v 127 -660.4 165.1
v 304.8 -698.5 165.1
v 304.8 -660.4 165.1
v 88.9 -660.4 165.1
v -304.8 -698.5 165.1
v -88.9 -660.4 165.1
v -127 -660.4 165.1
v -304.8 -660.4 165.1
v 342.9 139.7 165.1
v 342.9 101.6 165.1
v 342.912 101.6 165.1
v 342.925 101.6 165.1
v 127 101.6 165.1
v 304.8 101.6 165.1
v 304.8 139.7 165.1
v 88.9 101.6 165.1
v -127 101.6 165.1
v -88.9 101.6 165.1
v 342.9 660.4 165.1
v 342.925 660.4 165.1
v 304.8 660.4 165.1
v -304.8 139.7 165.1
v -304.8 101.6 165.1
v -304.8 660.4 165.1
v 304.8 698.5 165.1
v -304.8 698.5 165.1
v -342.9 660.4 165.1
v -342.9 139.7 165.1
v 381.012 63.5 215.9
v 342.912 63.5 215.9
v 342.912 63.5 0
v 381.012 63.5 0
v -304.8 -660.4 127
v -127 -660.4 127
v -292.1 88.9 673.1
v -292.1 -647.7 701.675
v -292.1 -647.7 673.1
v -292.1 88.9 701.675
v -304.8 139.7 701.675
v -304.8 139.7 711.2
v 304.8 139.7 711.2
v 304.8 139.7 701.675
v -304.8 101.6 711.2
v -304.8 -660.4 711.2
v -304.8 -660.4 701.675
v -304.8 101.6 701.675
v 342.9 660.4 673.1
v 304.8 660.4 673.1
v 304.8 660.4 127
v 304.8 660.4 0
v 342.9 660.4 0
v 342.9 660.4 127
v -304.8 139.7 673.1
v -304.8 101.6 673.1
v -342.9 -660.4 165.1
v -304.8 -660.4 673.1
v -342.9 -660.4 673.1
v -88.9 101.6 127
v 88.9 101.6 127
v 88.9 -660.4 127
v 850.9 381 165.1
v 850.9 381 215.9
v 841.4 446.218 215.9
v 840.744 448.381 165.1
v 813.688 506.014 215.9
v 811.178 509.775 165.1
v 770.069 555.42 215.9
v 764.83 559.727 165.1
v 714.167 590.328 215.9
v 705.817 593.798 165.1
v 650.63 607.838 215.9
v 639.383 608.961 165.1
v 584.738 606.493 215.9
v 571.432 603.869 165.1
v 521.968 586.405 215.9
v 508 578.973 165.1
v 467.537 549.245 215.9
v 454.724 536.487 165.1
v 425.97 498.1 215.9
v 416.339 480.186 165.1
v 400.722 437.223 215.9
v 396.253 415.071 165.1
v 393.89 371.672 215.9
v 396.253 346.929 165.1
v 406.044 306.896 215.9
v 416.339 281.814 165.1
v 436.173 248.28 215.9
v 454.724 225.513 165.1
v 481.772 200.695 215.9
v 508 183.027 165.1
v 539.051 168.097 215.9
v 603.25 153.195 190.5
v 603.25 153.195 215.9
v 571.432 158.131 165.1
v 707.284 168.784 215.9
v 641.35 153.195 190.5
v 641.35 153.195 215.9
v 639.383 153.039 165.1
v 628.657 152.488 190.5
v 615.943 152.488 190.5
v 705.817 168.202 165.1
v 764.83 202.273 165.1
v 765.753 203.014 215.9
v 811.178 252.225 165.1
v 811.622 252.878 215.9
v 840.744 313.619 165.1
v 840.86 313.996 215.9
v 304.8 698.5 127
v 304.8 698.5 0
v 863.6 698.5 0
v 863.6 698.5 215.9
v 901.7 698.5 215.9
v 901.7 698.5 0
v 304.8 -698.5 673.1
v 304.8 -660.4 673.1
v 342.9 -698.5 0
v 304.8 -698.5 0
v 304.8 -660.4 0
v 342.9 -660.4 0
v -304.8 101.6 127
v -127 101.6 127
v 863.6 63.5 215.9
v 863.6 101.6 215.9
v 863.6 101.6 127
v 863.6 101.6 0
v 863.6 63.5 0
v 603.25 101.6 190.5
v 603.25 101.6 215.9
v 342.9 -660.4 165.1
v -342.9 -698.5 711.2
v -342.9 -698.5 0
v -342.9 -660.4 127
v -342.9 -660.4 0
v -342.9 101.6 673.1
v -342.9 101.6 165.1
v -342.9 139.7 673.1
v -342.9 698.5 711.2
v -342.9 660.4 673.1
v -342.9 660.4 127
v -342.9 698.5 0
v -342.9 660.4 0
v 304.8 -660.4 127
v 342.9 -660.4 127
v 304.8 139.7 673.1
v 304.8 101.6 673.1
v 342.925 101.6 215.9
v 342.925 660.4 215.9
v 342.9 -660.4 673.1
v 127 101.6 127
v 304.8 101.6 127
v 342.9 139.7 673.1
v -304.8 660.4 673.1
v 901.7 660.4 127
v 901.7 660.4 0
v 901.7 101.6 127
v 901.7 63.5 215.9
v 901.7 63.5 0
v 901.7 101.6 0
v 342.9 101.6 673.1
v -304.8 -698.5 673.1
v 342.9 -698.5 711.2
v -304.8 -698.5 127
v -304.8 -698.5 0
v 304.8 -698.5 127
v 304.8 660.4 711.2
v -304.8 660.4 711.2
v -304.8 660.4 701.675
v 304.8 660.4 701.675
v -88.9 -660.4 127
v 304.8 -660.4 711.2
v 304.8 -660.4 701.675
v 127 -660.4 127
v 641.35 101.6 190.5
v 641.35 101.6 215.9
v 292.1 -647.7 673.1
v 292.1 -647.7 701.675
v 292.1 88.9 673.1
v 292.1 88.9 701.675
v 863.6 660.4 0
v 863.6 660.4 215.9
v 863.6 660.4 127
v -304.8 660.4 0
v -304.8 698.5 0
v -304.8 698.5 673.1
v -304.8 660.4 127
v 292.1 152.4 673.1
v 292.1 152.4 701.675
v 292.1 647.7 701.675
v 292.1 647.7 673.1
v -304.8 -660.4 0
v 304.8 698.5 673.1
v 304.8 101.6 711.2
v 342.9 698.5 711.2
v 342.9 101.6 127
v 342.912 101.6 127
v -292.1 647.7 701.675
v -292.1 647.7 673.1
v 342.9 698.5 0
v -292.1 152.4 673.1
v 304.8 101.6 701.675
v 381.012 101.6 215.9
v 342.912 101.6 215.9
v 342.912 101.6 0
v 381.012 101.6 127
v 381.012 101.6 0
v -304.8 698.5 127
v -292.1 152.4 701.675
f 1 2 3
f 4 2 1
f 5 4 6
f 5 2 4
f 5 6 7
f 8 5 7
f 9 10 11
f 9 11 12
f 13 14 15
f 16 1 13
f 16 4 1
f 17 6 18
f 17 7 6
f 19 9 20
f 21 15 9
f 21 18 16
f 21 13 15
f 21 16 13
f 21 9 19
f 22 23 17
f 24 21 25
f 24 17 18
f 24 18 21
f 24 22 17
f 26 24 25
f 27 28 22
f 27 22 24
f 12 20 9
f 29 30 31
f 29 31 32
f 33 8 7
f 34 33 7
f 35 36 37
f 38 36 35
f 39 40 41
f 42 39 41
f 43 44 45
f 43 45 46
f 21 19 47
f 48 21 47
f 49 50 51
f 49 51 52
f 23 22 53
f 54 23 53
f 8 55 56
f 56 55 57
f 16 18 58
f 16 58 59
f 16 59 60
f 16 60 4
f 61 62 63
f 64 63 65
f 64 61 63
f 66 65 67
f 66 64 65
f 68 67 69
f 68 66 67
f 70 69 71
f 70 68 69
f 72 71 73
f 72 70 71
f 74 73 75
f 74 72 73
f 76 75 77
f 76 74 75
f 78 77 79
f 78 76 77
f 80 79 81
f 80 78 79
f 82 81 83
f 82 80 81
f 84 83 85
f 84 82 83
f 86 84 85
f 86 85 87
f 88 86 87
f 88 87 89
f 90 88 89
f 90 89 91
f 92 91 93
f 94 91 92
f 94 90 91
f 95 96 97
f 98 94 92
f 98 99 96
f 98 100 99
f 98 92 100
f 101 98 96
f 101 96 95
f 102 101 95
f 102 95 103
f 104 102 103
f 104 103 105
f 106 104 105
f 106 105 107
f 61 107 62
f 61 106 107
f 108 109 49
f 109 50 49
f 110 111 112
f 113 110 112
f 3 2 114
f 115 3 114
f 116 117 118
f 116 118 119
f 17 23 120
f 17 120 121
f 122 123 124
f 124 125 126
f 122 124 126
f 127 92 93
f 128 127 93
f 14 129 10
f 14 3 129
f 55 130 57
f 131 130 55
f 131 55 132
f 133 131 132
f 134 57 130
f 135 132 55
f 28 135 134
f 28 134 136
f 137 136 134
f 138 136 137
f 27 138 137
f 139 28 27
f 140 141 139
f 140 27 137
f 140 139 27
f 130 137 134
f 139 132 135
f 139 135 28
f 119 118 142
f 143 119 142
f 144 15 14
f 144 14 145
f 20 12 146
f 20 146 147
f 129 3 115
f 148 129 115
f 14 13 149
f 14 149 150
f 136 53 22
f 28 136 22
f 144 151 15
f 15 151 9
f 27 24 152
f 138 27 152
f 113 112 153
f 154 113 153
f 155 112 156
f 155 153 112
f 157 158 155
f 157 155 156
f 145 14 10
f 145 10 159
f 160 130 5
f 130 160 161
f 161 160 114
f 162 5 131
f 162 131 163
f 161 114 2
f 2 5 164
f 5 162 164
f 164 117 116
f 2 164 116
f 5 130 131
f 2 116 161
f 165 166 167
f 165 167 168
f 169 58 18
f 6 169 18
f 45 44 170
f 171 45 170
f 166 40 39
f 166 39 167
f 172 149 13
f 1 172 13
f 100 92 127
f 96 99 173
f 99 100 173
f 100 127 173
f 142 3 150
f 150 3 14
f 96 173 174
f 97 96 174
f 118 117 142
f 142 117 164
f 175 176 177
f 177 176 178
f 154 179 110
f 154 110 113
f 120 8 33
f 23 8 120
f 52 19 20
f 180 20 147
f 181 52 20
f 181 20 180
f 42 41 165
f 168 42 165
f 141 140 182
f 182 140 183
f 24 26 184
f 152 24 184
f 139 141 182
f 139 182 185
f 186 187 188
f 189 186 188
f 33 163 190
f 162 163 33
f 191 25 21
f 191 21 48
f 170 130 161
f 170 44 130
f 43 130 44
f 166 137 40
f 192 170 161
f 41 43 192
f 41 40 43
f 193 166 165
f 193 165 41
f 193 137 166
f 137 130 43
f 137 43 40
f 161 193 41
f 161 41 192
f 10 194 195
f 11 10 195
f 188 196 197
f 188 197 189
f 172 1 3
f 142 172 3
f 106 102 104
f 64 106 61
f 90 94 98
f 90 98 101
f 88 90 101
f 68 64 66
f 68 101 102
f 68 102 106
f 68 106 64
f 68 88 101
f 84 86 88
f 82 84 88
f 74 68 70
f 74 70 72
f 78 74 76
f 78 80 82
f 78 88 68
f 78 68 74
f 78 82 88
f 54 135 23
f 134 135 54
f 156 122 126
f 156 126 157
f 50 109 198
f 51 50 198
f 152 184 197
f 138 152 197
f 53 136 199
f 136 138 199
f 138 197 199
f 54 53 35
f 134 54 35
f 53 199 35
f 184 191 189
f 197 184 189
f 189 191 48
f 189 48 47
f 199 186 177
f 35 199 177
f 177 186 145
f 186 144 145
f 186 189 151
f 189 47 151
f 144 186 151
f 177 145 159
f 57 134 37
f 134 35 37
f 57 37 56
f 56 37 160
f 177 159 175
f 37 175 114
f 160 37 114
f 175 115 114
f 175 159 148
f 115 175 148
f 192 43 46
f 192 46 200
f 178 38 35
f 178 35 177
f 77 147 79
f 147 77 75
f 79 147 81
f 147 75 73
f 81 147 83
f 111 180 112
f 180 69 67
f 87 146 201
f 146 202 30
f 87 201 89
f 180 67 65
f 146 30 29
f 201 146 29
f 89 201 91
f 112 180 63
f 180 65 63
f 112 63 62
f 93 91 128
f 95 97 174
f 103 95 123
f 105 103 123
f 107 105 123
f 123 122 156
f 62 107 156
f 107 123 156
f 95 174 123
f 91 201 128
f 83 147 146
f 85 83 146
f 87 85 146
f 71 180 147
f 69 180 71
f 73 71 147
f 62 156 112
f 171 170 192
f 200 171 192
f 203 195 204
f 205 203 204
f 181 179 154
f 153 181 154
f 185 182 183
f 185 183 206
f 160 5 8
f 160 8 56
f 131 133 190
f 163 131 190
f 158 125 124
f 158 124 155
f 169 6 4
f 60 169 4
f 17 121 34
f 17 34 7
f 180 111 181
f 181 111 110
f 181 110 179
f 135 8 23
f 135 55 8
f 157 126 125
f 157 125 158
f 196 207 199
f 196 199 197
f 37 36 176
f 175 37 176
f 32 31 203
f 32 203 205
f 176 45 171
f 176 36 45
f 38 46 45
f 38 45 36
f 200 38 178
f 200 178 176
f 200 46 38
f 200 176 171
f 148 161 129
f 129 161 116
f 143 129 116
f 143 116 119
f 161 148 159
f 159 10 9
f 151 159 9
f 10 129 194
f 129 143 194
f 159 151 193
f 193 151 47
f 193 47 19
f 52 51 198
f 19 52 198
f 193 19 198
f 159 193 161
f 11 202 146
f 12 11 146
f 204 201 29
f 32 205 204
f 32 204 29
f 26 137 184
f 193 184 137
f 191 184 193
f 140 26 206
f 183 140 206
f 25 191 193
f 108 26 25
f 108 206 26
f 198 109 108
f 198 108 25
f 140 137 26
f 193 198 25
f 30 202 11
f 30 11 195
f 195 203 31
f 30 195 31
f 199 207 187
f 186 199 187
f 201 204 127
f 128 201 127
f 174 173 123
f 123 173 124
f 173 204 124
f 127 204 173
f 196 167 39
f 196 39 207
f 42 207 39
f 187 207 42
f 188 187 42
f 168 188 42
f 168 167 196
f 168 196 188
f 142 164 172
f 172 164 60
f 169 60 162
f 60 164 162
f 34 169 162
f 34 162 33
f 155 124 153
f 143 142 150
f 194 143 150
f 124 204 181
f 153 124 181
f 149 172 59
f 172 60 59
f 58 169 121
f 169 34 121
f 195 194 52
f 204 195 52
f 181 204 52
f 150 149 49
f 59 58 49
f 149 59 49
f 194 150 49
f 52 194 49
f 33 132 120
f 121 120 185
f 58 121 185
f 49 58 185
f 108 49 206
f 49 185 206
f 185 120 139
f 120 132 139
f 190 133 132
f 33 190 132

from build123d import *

# Parameters (mm, degrees)
F0_W           = 685.8
F0_H           = 1397
F1_DEPTH       = 711.2
F2_W           = 609.6
F2_H           = 508
F2_H_2         = 88.9
F3_DEPTH       = 800.1
F4_W           = 609.6
F4_H           = 88.9
F5_DEPTH       = 596.901
F6_W           = 609.6
F6_H           = 762
F7_DEPTH       = 9.525
F8_W           = 584.2
F8_H           = 736.6
F9_DEPTH       = 50.8
F10_W          = 609.6
F10_H          = 38.1
F11_DEPTH      = 1397.001
F12_W          = 762
F12_H          = 508
F12_W_2        = 1320.8
F12_H_2        = 127
F13_DEPTH      = 685.801
F14_W          = 609.6
F14_H          = 508
F15_DEPTH      = 584.2
F16_W          = 609.6
F16_H          = 520.7
F17_DEPTH      = 9.525
F18_W          = 584.2
F18_H          = 495.3
F19_DEPTH      = 28.575
F21_DEPTH      = 685.801
F22_W          = 558.8
F22_H          = 38.1
F23_DEPTH      = 558.8
F24_W          = 558.7746
F24_H          = 558.8
F24_R          = 228.6
F25_DEPTH      = 50.8
F26_W          = 38.1
F26_H          = 25.4
F27_DEPTH      = 52.5951328439
F28_W          = 38.1
F28_H          = 38.1
F29_DEPTH      = 127
F29_DEPTH_BACK = 88.9
F30_W          = 609.6
F30_H          = 508
F31_DEPTH      = 12.7
F32_W          = 609.6
F32_H          = 762
F33_DEPTH      = 165.101
F34_W          = 38.1
F34_H          = 38.1
F35_DEPTH      = 762


# Not quite as in the source:
# - a length typed as a fraction of an inch, garbled in the dataset ("3 / 203.2 mm" for 3/8 in), is restored


with BuildPart() as f1:
    # F0 (on Top) → F1 (new body)
    with BuildSketch(Plane.XY):
        Rectangle(F0_W, F0_H)
    extrude(amount=F1_DEPTH)

    # F2 (on face) → F3 (cut)
    with BuildSketch(Plane.XZ.offset(698.5)):
        with Locations((0, 419.1)):
            Rectangle(F2_W, F2_H)
        with Locations((0, 82.55)):
            Rectangle(F2_W, F2_H_2)
    extrude(amount=-F3_DEPTH, mode=Mode.SUBTRACT)

    # F4 (on face) → F5 (cut, through all)
    with BuildSketch(Plane.XZ.offset(-101.6)):
        with Locations((0, 82.55)):
            Rectangle(F4_W, F4_H)
    extrude(amount=-F5_DEPTH, mode=Mode.SUBTRACT)

    # F6 (on face) → F7 (cut)
    with BuildSketch(Plane.XY.offset(711.2)):
        with Locations((0, -279.4)):
            Rectangle(F6_W, F6_H)
    extrude(amount=-F7_DEPTH, mode=Mode.SUBTRACT)

    # F8 (on face) → F9 (cut)
    with BuildSketch(Plane.XY.offset(701.675)):
        with Locations((0, -279.4)):
            Rectangle(F8_W, F8_H)
    extrude(amount=-F9_DEPTH, mode=Mode.SUBTRACT)

    # F10 (on face) → F11 (cut, through all)
    with BuildSketch(Plane.XZ.offset(698.5)):
        with Locations((0, 19.05)):
            Rectangle(F10_W, F10_H)
    extrude(amount=-F11_DEPTH, mode=Mode.SUBTRACT)

    # F12 (on face) → F13 (cut, through all)
    with BuildSketch(Plane(origin=(-342.9, 0, 0), x_dir=(0, -1, 0), z_dir=(-1, 0, 0))):
        with Locations((279.4, 419.1)):
            Rectangle(F12_W, F12_H)
        with Locations((0, 63.5)):
            Rectangle(F12_W_2, F12_H_2)
    extrude(amount=-F13_DEPTH, mode=Mode.SUBTRACT)

    # F14 (on face) → F15 (cut)
    with BuildSketch(Plane(origin=(0, 698.5, 0), x_dir=(-1, 0, 0), z_dir=(0, 1, 0))):
        with Locations((0, 419.1)):
            Rectangle(F14_W, F14_H)
    extrude(amount=-F15_DEPTH, mode=Mode.SUBTRACT)

    # F16 (on face) → F17 (cut)
    with BuildSketch(Plane.XY.offset(711.2)):
        with Locations((0, 400.05)):
            Rectangle(F16_W, F16_H)
    extrude(amount=-F17_DEPTH, mode=Mode.SUBTRACT)

    # F18 (on face) → F19 (cut, through all)
    with BuildSketch(Plane.XY.offset(701.675)):
        with Locations((0, 400.05)):
            Rectangle(F18_W, F18_H)
    extrude(amount=-F19_DEPTH, mode=Mode.SUBTRACT)

    # F20 (on face) → F21 (cut, through all)
    with BuildSketch(Plane.YZ.offset(342.9)):
        Polygon((660.4, 673.1), (647.7, 673.1), (152.4, 673.1), (139.7, 673.1), (139.7, 165.1), (660.4, 165.1), align=None)
    extrude(amount=-F21_DEPTH, mode=Mode.SUBTRACT)

    # F22 (on face) → F23 (join)
    with BuildSketch(Plane.YZ.offset(342.9)):
        with Locations((381, 146.05)):
            Rectangle(F22_W, F22_H)
    extrude(amount=F23_DEPTH)

    # F24 (on face) → F25 (join)
    with BuildSketch(Plane.XY.offset(165.1)):
        with Locations((622.3127, 381)):
            Rectangle(F24_W, F24_H)
        with Locations((622.3, 381)):
            Circle(F24_R, mode=Mode.SUBTRACT)
    extrude(amount=F25_DEPTH)

    # F26 (on face) → F27 (cut, up to face)
    with BuildSketch(Plane.XZ.offset(-101.6)):
        with Locations((622.3, 203.2)):
            Rectangle(F26_W, F26_H)
    extrude(amount=-F27_DEPTH, mode=Mode.SUBTRACT)

    # F28 (on face) → F29 (join, two sides)
    with BuildSketch(Plane(origin=(0, 0, 127), x_dir=(1, 0, 0), z_dir=(0, 0, -1))) as f29_sk:
        with Locations((882.65, -82.55)):
            Rectangle(F28_W, F28_H)
        with Locations((882.65, -679.45)):
            Rectangle(F28_W, F28_H)
        with Locations((361.9619884968, -82.55)):
            Rectangle(F28_W, F28_H)
    extrude(amount=F29_DEPTH)
    extrude(f29_sk.sketch, amount=-F29_DEPTH_BACK)

    # F30 (on face) → F31 (cut, through all)
    with BuildSketch(Plane(origin=(0, 114.3, 0), x_dir=(-1, 0, 0), z_dir=(0, 1, 0))):
        with Locations((0, 419.1)):
            Rectangle(F30_W, F30_H)
    extrude(amount=-F31_DEPTH, mode=Mode.SUBTRACT)

    # F32 (on face) → F33 (cut, through all)
    with BuildSketch(Plane.XY.offset(165.1)):
        with Locations((0, -279.4)):
            Rectangle(F32_W, F32_H)
    extrude(amount=-F33_DEPTH, mode=Mode.SUBTRACT)

    # F34 (on face) → F35 (join, through all)
    with BuildSketch(Plane.XZ.offset(-101.6)):
        with Locations((107.95, 146.05)):
            Rectangle(F34_W, F34_H)
        with Locations((-107.95, 146.05)):
            Rectangle(F34_W, F34_H)
    extrude(amount=F35_DEPTH)


solid = f1.part
